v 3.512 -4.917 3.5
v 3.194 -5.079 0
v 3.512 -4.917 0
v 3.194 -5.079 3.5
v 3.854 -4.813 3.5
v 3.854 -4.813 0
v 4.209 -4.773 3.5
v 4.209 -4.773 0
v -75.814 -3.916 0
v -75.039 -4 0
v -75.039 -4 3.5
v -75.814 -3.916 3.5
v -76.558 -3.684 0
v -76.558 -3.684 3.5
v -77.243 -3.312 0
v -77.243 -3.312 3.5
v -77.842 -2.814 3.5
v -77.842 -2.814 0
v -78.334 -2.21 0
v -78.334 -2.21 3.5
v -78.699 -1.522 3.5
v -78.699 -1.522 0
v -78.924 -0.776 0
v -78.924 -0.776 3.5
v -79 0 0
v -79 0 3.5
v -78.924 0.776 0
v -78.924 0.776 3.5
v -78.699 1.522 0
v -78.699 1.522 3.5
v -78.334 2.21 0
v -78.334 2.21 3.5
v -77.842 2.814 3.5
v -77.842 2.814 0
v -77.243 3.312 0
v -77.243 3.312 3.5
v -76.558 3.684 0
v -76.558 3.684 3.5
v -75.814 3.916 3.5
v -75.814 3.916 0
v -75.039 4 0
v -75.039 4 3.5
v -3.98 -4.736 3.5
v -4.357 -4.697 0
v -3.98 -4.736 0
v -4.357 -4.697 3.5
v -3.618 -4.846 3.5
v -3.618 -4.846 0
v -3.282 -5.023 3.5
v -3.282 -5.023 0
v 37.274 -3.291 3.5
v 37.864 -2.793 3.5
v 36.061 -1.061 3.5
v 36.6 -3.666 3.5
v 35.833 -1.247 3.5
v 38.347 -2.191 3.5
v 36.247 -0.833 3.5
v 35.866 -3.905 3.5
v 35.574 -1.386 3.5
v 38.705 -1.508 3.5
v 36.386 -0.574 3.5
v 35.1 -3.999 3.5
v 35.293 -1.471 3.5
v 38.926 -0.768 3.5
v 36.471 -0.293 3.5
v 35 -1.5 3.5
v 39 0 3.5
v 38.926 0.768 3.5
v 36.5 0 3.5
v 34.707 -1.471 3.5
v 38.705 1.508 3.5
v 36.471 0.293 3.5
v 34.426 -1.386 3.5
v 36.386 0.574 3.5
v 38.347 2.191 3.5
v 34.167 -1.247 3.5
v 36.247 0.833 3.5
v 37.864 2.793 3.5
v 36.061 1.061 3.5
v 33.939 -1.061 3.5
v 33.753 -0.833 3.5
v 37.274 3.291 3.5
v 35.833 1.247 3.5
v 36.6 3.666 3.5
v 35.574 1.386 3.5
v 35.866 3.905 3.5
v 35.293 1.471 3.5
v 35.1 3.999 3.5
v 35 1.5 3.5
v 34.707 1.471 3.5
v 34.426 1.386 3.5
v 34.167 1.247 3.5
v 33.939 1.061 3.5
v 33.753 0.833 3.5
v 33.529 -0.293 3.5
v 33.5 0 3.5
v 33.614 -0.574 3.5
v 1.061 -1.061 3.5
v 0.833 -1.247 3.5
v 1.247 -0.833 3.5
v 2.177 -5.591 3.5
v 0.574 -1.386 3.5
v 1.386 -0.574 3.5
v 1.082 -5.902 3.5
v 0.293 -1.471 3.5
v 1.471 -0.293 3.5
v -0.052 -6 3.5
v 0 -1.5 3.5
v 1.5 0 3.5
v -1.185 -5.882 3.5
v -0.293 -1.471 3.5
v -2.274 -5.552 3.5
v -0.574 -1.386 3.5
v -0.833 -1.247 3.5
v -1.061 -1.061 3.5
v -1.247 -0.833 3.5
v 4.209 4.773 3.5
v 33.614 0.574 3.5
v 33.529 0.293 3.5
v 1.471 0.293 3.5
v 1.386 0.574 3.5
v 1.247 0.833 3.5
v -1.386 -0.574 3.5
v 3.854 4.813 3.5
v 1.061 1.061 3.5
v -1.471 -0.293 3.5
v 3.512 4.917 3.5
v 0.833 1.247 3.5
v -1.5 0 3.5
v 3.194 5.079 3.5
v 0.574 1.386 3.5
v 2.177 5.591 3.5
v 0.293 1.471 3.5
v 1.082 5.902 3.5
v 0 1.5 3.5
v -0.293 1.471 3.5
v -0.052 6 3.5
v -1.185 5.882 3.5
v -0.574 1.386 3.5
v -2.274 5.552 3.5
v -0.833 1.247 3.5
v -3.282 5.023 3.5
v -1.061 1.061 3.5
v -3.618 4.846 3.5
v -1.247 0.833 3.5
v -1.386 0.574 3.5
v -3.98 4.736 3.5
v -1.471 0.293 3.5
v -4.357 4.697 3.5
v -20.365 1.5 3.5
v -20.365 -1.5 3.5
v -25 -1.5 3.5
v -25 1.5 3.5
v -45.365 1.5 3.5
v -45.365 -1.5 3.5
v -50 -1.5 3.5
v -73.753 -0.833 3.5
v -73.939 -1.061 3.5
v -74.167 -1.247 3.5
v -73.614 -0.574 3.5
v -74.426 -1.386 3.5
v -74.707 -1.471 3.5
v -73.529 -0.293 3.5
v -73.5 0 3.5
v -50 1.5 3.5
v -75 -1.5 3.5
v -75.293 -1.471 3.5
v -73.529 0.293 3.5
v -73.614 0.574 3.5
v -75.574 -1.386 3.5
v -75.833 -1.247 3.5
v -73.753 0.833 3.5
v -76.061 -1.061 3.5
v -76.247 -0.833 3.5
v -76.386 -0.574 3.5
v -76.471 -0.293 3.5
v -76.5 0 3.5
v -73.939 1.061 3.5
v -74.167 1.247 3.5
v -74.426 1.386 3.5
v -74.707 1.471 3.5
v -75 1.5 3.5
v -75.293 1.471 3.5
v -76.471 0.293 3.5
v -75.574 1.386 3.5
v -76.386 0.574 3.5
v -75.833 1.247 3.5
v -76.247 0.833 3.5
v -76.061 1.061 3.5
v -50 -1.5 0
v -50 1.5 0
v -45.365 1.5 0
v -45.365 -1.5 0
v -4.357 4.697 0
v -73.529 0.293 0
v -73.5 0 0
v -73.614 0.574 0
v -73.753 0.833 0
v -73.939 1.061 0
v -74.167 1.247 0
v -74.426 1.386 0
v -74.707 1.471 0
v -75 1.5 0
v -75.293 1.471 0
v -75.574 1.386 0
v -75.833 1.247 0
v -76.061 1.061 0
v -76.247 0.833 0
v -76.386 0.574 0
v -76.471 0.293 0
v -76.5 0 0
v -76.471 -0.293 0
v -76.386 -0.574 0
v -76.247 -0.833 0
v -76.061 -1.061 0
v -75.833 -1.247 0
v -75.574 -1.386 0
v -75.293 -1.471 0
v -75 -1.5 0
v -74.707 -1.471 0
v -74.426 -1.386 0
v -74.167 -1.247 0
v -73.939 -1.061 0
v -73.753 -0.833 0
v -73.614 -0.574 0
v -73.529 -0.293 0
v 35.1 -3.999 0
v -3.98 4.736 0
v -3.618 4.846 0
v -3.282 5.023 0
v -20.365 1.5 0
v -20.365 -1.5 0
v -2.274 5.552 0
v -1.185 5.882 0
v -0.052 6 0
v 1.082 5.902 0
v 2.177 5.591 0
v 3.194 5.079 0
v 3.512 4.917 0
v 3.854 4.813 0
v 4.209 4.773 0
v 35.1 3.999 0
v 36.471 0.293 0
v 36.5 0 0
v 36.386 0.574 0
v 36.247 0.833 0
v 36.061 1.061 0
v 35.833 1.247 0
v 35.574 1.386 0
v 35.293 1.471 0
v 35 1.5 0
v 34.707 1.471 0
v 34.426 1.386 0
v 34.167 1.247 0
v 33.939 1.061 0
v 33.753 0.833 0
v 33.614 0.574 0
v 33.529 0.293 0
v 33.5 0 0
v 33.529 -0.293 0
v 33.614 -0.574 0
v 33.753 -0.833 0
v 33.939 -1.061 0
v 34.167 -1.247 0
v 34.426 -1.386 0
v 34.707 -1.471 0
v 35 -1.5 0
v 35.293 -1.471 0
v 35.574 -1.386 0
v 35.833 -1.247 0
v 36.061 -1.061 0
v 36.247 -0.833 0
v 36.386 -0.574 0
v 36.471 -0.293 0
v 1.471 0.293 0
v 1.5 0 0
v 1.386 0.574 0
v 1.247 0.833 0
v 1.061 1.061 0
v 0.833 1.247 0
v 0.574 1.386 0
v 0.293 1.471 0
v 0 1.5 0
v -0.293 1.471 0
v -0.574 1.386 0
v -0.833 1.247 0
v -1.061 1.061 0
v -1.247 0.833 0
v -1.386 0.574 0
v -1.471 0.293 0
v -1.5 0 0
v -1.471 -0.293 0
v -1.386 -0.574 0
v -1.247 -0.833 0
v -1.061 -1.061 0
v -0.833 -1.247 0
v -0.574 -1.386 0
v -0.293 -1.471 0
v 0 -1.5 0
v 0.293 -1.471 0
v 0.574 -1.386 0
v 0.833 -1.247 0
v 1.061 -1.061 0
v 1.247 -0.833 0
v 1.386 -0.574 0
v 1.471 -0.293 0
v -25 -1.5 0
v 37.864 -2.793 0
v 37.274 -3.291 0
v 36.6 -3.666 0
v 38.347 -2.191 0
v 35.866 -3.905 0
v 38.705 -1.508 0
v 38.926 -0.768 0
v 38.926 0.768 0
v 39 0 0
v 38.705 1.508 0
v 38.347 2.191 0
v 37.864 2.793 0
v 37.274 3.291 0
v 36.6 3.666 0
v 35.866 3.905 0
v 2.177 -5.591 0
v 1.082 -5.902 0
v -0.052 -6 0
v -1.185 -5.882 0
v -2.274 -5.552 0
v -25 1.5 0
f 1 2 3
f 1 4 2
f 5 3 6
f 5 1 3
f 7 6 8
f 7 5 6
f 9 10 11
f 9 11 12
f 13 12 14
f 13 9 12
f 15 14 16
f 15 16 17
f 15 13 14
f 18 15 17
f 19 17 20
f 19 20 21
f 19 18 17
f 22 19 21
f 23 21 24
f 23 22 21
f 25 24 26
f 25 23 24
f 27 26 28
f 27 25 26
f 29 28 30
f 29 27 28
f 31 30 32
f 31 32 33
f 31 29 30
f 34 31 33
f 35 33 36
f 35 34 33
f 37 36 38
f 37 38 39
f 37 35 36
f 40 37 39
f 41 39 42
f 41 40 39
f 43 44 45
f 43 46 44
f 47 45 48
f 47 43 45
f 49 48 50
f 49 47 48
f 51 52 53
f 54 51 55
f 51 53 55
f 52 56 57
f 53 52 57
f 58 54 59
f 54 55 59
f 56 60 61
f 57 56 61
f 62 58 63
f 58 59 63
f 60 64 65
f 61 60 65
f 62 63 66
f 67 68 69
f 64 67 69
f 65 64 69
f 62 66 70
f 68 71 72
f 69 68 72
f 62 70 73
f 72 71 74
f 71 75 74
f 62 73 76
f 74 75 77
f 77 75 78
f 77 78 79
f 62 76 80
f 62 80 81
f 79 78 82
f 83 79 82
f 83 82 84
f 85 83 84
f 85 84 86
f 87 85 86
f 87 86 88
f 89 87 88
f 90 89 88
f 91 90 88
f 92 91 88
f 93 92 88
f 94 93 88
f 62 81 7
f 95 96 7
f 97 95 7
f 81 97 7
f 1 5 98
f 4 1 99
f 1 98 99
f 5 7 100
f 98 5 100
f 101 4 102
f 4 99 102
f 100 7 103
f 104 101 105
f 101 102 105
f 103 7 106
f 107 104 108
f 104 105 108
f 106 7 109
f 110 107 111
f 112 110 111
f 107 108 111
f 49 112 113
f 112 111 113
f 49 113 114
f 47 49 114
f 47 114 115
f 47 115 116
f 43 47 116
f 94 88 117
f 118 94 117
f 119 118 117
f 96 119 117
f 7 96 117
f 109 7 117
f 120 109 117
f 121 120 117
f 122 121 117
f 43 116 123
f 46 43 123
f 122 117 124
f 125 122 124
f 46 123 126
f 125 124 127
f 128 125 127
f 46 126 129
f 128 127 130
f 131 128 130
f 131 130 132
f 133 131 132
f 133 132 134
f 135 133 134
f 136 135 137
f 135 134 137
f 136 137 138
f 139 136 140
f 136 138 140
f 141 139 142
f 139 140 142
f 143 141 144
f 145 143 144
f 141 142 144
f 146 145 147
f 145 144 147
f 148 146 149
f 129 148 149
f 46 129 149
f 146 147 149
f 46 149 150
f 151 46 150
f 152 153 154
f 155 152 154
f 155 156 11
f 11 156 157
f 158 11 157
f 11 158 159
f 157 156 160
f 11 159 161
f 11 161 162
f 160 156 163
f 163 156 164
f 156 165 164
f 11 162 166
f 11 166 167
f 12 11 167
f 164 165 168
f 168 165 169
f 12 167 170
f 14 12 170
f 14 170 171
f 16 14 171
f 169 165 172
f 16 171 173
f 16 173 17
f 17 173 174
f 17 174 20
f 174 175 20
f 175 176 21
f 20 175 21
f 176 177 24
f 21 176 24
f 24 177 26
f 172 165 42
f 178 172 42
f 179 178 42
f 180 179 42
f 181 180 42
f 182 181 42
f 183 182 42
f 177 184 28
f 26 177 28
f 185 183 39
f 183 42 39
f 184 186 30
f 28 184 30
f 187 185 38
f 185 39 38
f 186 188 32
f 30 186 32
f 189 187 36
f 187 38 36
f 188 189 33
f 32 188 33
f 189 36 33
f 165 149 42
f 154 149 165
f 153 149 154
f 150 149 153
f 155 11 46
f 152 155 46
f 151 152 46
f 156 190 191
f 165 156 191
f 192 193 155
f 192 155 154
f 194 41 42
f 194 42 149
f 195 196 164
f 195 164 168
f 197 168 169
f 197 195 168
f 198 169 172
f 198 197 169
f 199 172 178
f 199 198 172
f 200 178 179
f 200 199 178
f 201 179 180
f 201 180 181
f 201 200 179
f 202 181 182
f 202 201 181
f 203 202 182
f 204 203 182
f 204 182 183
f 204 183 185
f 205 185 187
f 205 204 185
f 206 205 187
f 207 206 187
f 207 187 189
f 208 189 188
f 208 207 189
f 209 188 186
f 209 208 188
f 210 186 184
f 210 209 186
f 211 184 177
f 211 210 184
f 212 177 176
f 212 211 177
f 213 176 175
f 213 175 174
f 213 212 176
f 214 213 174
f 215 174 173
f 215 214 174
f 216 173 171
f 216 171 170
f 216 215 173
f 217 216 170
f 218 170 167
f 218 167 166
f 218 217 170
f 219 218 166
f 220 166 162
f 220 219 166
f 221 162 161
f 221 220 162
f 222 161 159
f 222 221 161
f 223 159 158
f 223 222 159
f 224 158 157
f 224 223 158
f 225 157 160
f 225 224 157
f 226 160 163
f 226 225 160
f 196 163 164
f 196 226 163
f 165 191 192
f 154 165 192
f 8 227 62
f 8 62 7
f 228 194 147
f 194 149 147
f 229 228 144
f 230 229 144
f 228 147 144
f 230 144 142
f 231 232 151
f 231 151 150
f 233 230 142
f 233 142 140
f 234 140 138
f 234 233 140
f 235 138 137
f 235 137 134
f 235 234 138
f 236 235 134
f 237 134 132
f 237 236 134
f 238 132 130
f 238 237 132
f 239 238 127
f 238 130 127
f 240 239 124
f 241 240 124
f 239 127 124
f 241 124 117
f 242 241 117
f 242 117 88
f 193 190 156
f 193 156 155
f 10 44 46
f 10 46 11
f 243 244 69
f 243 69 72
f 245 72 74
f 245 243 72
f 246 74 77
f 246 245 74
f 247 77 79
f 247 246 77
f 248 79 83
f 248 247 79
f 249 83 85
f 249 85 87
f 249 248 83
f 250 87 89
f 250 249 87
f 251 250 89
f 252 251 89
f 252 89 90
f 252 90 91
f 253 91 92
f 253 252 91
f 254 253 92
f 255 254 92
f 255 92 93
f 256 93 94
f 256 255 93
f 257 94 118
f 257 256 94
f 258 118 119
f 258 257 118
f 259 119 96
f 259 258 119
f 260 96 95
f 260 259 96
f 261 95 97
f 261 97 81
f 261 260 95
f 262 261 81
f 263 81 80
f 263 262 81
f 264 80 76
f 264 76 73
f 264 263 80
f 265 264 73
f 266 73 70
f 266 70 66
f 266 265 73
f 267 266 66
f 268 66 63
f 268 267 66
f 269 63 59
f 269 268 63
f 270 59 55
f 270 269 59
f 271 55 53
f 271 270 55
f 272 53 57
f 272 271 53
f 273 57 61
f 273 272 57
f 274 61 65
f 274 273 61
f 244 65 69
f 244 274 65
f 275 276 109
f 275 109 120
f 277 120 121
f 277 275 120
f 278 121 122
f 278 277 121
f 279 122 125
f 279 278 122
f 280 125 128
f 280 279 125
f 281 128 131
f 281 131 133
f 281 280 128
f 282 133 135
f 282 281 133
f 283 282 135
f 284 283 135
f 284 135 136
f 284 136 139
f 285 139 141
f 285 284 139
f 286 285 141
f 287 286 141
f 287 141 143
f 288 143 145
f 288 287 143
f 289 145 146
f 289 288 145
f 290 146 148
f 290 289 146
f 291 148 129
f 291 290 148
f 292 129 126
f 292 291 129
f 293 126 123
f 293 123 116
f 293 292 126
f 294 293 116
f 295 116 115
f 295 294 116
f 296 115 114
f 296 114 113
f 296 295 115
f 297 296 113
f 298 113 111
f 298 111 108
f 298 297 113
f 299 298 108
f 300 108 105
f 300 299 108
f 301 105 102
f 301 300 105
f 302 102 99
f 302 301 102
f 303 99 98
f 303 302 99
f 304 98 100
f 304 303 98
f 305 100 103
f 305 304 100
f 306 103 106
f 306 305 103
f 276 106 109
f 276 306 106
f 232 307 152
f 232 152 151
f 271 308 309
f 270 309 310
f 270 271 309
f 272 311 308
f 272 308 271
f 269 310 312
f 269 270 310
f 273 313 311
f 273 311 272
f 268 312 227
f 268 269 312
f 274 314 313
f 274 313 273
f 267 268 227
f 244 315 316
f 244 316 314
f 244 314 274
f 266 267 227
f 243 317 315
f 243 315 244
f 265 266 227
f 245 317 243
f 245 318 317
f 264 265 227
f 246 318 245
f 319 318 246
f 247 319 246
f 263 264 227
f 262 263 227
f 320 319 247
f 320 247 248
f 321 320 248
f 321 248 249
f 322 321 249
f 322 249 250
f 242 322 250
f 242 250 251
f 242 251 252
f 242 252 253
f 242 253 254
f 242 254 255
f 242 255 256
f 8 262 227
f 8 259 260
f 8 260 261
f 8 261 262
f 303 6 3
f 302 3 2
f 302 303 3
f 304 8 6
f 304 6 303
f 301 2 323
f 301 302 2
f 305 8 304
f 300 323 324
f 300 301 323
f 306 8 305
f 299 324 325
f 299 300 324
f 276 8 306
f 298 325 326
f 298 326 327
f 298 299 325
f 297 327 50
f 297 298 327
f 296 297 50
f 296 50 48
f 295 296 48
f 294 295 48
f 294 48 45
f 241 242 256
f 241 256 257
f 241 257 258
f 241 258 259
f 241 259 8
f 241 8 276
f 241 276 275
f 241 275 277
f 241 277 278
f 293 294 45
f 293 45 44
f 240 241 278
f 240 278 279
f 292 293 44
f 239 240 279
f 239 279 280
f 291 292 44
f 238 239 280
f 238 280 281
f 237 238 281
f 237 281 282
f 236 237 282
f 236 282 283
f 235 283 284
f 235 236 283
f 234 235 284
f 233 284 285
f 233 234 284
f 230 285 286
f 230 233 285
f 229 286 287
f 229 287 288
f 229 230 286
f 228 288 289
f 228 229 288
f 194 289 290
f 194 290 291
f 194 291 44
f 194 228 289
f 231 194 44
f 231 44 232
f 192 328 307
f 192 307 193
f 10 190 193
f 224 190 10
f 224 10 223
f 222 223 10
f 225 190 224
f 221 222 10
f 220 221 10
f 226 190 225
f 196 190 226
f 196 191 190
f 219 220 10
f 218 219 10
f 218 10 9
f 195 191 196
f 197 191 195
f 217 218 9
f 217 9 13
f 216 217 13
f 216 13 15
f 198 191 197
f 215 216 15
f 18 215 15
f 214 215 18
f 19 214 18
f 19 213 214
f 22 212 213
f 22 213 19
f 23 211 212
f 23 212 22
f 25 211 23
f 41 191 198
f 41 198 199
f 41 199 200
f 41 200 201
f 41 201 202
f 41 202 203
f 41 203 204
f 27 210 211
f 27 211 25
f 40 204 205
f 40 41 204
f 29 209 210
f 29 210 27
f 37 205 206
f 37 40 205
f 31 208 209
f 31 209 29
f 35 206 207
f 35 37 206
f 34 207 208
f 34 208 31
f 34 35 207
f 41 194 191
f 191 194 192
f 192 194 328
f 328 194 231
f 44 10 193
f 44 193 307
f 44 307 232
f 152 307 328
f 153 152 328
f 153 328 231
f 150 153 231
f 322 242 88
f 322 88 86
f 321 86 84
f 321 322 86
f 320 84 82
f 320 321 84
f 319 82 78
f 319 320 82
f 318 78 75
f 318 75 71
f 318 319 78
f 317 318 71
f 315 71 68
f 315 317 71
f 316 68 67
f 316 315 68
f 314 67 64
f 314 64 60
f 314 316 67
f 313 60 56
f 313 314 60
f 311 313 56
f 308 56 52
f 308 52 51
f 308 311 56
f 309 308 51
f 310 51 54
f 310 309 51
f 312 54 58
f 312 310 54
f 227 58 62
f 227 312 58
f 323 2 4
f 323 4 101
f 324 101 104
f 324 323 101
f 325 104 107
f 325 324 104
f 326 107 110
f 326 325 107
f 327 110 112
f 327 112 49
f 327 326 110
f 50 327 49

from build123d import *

# Parameters (mm, degrees)
SKETCH1_R           = 1.5
SKETCH1_W           = 4.635083662
SKETCH1_H           = 3
BOSS_EXTRUDE1_DEPTH = 3.5
FILLET1_R           = 2


with BuildPart() as part:
    # Sketch1 → Boss-Extrude1 (new body)
    with BuildSketch(Plane.XY):
        with BuildLine():
            Line((-75.039443802, 3.999805519), (-3.725751189, 4.703060501))
            ThreePointArc((-3.725751189, 4.703060501), (-0.06893841, 5.999603945), (3.616700782, 4.787428898))
            Line((3.616700782, 4.787428898), (35.100171426, 3.998745514))
            ThreePointArc((35.100171426, 3.998745514), (39, 0), (35.100171426, -3.998745514))
            Line((35.100171426, -3.998745514), (3.616700782, -4.787428898))
            ThreePointArc((3.616700782, -4.787428898), (-0.06893841, -5.999603945), (-3.725751189, -4.703060501))
            Line((-3.725751189, -4.703060501), (-75.039443802, -3.999805519))
            ThreePointArc((-75.039443802, -3.999805519), (-79, 0), (-75.039443802, 3.999805519))
        make_face()
        with Locations((-75, 0)):
            Circle(SKETCH1_R, mode=Mode.SUBTRACT)
        Circle(SKETCH1_R, mode=Mode.SUBTRACT)
        with Locations((35, 0)):
            Circle(SKETCH1_R, mode=Mode.SUBTRACT)
        with Locations((-22.682458169, 0)):
            Rectangle(SKETCH1_W, SKETCH1_H, mode=Mode.SUBTRACT)
        with Locations((-47.682458169, 0)):
            Rectangle(SKETCH1_W, SKETCH1_H, mode=Mode.SUBTRACT)
    extrude(amount=BOSS_EXTRUDE1_DEPTH)

    # Fillet1
    fillet1_edges = [part.edges().sort_by_distance(p)[0] for p in [
        (-3.725751189, 4.703060501, 1.75),
        (3.616700782, 4.787428898, 1.75),
        (3.616700782, -4.787428898, 1.75),
        (-3.725751189, -4.703060501, 1.75),
    ]]
    fillet(fillet1_edges, radius=FILLET1_R)


solid = part.part
